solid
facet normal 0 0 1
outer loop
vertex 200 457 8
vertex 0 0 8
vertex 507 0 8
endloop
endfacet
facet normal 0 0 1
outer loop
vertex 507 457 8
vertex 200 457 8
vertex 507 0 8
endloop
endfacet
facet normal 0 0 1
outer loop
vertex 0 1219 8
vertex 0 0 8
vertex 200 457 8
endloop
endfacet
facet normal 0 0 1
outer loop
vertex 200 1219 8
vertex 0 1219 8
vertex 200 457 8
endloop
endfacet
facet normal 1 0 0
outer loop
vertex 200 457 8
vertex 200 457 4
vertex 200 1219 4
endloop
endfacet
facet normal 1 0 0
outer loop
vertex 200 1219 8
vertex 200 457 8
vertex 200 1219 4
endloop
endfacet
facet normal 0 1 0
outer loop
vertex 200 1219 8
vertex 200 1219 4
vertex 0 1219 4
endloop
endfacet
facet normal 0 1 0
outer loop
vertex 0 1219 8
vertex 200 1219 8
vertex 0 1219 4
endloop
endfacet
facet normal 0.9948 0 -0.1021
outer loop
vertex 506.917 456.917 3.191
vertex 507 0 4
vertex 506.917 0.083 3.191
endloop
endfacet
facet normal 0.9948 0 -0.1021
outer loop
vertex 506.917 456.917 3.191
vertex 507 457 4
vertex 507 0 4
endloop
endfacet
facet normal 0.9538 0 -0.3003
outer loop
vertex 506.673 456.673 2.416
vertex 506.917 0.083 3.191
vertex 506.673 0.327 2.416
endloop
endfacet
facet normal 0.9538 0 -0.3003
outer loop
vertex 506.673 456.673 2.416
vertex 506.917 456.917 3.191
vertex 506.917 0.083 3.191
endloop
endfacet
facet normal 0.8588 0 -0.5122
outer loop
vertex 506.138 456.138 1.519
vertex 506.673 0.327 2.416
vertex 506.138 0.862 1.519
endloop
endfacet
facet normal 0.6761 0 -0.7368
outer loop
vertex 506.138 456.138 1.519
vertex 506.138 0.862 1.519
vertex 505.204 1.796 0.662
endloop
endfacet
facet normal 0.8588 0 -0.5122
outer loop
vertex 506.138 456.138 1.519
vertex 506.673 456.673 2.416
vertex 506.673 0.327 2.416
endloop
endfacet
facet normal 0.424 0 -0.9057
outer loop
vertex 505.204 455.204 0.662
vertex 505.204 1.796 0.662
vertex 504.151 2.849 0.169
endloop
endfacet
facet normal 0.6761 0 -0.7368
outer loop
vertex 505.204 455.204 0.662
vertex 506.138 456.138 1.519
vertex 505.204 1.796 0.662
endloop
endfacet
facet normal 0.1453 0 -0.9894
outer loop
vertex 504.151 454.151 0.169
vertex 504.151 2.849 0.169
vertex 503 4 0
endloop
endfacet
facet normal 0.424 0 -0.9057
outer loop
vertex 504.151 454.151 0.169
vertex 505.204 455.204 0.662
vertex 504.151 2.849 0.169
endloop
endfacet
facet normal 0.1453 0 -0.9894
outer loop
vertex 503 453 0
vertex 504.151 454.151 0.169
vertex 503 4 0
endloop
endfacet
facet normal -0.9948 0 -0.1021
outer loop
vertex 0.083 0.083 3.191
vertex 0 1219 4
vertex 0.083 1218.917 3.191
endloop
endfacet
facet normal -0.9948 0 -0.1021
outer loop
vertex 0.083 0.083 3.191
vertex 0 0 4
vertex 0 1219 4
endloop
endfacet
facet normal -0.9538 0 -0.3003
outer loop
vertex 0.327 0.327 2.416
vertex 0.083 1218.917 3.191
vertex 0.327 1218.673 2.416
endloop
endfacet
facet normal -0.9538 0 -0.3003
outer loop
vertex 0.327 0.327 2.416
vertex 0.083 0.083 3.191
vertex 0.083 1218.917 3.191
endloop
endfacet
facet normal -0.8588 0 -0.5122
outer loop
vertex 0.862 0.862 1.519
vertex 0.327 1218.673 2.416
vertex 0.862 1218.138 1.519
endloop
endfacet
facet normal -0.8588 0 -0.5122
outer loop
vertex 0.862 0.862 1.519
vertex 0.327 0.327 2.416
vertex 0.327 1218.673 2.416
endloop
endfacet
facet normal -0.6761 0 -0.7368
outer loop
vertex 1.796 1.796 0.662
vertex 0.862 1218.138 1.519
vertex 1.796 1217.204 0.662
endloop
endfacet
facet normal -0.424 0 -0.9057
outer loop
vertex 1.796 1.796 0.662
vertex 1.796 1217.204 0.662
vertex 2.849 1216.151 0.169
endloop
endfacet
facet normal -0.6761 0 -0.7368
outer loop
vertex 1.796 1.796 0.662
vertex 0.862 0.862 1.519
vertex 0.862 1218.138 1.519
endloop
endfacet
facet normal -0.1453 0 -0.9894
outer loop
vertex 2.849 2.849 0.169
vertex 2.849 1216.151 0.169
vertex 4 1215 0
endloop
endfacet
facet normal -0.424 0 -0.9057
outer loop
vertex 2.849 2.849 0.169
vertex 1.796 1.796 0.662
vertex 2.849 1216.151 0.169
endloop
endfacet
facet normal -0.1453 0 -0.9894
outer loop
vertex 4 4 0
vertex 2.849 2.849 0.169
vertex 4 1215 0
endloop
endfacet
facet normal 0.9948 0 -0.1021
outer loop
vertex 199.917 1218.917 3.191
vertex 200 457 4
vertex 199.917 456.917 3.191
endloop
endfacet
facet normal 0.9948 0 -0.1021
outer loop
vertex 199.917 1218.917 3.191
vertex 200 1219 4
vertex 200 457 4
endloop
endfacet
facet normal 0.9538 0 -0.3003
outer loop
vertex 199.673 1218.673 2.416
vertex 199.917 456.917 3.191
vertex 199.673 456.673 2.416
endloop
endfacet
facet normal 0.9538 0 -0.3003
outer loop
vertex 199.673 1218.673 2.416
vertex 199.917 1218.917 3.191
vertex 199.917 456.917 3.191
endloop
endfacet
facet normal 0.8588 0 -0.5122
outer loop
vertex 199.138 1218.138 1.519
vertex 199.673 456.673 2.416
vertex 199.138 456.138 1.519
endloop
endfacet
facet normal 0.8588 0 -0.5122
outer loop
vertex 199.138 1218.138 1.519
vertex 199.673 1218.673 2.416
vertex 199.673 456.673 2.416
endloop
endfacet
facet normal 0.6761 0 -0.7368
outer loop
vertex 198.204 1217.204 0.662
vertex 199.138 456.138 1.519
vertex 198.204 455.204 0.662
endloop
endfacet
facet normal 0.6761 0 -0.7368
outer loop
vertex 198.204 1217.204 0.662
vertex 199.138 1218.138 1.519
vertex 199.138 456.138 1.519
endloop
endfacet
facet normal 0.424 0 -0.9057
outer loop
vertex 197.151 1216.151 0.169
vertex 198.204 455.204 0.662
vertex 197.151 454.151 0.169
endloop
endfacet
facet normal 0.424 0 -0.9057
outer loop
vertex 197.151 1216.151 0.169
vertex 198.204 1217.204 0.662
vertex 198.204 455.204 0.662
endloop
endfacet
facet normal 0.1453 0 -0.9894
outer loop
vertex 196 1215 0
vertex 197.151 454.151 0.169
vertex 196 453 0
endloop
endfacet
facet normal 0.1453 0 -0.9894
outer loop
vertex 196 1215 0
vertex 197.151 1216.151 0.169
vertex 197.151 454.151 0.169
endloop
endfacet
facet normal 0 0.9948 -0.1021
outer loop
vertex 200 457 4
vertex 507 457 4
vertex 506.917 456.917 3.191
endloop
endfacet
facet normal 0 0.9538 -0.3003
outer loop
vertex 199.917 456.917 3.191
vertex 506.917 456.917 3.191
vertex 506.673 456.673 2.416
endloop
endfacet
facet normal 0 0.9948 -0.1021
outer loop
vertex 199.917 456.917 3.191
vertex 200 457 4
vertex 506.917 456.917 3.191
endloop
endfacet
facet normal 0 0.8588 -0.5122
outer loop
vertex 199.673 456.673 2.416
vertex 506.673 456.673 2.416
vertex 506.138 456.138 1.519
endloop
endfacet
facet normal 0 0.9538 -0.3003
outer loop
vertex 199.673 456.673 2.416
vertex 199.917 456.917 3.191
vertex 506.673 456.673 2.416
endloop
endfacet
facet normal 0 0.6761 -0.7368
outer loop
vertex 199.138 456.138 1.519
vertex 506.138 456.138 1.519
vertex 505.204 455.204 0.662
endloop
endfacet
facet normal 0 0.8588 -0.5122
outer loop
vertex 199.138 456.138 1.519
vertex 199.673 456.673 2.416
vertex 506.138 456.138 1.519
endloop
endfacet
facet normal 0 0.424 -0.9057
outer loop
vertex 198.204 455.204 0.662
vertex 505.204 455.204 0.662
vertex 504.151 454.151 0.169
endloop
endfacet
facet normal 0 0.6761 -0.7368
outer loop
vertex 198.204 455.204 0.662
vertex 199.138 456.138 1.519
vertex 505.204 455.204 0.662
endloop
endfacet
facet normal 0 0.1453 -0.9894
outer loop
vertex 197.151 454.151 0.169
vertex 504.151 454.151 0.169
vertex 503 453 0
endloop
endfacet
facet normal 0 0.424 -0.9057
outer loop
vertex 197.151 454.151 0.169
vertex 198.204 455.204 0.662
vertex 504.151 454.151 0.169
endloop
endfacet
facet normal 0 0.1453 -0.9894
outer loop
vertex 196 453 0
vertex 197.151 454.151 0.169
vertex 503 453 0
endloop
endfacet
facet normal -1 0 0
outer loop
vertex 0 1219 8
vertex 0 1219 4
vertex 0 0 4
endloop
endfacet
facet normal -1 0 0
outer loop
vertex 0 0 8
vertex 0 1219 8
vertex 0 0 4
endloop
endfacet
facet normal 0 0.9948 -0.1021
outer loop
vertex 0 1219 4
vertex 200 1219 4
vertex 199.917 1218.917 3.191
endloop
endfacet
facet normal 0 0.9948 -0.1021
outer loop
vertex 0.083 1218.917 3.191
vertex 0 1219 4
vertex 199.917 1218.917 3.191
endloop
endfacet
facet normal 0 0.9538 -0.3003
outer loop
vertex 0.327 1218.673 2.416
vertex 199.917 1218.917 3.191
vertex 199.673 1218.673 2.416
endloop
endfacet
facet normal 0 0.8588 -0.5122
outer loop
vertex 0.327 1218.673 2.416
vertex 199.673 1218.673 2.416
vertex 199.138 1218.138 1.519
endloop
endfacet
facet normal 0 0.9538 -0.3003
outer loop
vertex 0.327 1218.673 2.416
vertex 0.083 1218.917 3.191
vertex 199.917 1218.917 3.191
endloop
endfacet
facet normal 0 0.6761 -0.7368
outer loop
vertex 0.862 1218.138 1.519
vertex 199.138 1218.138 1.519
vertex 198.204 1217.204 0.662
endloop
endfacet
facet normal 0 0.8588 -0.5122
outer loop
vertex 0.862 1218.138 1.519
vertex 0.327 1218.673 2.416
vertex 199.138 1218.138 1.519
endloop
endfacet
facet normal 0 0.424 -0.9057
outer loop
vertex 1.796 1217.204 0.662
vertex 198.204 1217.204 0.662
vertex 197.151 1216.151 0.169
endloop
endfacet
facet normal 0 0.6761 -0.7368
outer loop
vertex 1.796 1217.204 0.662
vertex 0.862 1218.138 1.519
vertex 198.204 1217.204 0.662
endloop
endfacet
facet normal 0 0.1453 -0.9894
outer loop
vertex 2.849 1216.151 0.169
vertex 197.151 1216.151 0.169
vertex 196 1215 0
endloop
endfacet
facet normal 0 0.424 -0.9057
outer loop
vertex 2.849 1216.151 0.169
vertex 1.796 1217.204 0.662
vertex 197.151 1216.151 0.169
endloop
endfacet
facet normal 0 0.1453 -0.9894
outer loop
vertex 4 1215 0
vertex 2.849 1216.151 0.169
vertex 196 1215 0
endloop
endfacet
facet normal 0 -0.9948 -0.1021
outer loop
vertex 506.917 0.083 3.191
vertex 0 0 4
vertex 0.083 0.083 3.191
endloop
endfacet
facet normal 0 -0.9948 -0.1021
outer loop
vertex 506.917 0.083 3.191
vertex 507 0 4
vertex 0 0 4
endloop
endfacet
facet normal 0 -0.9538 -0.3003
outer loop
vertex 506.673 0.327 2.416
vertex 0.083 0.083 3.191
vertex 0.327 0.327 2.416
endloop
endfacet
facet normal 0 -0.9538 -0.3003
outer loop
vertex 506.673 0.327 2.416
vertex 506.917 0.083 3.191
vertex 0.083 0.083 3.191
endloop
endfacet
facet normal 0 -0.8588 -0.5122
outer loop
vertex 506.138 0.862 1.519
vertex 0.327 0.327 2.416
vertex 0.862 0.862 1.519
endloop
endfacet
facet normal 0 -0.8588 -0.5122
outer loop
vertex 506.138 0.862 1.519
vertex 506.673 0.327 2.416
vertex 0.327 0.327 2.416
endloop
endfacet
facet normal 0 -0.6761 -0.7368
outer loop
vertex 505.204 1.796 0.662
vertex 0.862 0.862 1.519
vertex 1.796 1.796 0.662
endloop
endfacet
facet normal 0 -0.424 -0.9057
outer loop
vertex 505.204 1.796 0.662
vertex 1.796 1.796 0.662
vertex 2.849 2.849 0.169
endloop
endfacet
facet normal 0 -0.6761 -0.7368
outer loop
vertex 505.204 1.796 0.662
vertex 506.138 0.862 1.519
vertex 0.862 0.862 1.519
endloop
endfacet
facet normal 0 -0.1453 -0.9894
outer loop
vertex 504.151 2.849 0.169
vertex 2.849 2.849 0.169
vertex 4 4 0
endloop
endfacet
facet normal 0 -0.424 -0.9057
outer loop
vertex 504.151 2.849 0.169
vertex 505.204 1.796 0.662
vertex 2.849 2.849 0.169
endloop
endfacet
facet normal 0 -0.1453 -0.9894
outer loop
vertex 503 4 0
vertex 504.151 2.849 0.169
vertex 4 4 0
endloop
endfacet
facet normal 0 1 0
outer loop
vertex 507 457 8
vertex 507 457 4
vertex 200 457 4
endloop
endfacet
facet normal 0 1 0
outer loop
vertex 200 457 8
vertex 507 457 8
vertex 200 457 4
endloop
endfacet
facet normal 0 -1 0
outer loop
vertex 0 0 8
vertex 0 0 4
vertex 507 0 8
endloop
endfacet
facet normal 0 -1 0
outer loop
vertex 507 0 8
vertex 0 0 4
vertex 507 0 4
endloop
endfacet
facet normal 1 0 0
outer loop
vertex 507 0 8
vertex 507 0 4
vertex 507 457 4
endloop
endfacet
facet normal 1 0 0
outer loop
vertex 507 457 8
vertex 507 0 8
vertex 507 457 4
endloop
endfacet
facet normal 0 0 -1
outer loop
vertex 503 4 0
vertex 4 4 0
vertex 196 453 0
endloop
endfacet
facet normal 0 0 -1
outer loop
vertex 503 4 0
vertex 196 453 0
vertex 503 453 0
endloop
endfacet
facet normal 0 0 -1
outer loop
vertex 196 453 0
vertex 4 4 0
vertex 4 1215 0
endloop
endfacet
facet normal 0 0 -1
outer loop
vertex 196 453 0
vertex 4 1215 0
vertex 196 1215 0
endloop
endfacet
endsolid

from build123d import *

# Parameters (mm, degrees)
F1_DEPTH = 8
F2_R     = 4


with BuildPart() as f1:
    # F0 (on Top) → F1 (new body)
    with BuildSketch(Plane.XY):
        Polygon((0, 1219), (0, 0), (507, 0), (507, 457), (200, 457), (200, 1219), align=None)
    extrude(amount=F1_DEPTH)

    # F2
    f2_edges = [f1.edges().sort_by_distance(p)[0] for p in [
        (0, 609.5, 0),
        (253.5, 0, 0),
        (507, 228.5, 0),
        (353.5, 457, 0),
        (200, 838, 0),
        (100, 1219, 0),
    ]]
    fillet(f2_edges, radius=F2_R)


solid = f1.part
